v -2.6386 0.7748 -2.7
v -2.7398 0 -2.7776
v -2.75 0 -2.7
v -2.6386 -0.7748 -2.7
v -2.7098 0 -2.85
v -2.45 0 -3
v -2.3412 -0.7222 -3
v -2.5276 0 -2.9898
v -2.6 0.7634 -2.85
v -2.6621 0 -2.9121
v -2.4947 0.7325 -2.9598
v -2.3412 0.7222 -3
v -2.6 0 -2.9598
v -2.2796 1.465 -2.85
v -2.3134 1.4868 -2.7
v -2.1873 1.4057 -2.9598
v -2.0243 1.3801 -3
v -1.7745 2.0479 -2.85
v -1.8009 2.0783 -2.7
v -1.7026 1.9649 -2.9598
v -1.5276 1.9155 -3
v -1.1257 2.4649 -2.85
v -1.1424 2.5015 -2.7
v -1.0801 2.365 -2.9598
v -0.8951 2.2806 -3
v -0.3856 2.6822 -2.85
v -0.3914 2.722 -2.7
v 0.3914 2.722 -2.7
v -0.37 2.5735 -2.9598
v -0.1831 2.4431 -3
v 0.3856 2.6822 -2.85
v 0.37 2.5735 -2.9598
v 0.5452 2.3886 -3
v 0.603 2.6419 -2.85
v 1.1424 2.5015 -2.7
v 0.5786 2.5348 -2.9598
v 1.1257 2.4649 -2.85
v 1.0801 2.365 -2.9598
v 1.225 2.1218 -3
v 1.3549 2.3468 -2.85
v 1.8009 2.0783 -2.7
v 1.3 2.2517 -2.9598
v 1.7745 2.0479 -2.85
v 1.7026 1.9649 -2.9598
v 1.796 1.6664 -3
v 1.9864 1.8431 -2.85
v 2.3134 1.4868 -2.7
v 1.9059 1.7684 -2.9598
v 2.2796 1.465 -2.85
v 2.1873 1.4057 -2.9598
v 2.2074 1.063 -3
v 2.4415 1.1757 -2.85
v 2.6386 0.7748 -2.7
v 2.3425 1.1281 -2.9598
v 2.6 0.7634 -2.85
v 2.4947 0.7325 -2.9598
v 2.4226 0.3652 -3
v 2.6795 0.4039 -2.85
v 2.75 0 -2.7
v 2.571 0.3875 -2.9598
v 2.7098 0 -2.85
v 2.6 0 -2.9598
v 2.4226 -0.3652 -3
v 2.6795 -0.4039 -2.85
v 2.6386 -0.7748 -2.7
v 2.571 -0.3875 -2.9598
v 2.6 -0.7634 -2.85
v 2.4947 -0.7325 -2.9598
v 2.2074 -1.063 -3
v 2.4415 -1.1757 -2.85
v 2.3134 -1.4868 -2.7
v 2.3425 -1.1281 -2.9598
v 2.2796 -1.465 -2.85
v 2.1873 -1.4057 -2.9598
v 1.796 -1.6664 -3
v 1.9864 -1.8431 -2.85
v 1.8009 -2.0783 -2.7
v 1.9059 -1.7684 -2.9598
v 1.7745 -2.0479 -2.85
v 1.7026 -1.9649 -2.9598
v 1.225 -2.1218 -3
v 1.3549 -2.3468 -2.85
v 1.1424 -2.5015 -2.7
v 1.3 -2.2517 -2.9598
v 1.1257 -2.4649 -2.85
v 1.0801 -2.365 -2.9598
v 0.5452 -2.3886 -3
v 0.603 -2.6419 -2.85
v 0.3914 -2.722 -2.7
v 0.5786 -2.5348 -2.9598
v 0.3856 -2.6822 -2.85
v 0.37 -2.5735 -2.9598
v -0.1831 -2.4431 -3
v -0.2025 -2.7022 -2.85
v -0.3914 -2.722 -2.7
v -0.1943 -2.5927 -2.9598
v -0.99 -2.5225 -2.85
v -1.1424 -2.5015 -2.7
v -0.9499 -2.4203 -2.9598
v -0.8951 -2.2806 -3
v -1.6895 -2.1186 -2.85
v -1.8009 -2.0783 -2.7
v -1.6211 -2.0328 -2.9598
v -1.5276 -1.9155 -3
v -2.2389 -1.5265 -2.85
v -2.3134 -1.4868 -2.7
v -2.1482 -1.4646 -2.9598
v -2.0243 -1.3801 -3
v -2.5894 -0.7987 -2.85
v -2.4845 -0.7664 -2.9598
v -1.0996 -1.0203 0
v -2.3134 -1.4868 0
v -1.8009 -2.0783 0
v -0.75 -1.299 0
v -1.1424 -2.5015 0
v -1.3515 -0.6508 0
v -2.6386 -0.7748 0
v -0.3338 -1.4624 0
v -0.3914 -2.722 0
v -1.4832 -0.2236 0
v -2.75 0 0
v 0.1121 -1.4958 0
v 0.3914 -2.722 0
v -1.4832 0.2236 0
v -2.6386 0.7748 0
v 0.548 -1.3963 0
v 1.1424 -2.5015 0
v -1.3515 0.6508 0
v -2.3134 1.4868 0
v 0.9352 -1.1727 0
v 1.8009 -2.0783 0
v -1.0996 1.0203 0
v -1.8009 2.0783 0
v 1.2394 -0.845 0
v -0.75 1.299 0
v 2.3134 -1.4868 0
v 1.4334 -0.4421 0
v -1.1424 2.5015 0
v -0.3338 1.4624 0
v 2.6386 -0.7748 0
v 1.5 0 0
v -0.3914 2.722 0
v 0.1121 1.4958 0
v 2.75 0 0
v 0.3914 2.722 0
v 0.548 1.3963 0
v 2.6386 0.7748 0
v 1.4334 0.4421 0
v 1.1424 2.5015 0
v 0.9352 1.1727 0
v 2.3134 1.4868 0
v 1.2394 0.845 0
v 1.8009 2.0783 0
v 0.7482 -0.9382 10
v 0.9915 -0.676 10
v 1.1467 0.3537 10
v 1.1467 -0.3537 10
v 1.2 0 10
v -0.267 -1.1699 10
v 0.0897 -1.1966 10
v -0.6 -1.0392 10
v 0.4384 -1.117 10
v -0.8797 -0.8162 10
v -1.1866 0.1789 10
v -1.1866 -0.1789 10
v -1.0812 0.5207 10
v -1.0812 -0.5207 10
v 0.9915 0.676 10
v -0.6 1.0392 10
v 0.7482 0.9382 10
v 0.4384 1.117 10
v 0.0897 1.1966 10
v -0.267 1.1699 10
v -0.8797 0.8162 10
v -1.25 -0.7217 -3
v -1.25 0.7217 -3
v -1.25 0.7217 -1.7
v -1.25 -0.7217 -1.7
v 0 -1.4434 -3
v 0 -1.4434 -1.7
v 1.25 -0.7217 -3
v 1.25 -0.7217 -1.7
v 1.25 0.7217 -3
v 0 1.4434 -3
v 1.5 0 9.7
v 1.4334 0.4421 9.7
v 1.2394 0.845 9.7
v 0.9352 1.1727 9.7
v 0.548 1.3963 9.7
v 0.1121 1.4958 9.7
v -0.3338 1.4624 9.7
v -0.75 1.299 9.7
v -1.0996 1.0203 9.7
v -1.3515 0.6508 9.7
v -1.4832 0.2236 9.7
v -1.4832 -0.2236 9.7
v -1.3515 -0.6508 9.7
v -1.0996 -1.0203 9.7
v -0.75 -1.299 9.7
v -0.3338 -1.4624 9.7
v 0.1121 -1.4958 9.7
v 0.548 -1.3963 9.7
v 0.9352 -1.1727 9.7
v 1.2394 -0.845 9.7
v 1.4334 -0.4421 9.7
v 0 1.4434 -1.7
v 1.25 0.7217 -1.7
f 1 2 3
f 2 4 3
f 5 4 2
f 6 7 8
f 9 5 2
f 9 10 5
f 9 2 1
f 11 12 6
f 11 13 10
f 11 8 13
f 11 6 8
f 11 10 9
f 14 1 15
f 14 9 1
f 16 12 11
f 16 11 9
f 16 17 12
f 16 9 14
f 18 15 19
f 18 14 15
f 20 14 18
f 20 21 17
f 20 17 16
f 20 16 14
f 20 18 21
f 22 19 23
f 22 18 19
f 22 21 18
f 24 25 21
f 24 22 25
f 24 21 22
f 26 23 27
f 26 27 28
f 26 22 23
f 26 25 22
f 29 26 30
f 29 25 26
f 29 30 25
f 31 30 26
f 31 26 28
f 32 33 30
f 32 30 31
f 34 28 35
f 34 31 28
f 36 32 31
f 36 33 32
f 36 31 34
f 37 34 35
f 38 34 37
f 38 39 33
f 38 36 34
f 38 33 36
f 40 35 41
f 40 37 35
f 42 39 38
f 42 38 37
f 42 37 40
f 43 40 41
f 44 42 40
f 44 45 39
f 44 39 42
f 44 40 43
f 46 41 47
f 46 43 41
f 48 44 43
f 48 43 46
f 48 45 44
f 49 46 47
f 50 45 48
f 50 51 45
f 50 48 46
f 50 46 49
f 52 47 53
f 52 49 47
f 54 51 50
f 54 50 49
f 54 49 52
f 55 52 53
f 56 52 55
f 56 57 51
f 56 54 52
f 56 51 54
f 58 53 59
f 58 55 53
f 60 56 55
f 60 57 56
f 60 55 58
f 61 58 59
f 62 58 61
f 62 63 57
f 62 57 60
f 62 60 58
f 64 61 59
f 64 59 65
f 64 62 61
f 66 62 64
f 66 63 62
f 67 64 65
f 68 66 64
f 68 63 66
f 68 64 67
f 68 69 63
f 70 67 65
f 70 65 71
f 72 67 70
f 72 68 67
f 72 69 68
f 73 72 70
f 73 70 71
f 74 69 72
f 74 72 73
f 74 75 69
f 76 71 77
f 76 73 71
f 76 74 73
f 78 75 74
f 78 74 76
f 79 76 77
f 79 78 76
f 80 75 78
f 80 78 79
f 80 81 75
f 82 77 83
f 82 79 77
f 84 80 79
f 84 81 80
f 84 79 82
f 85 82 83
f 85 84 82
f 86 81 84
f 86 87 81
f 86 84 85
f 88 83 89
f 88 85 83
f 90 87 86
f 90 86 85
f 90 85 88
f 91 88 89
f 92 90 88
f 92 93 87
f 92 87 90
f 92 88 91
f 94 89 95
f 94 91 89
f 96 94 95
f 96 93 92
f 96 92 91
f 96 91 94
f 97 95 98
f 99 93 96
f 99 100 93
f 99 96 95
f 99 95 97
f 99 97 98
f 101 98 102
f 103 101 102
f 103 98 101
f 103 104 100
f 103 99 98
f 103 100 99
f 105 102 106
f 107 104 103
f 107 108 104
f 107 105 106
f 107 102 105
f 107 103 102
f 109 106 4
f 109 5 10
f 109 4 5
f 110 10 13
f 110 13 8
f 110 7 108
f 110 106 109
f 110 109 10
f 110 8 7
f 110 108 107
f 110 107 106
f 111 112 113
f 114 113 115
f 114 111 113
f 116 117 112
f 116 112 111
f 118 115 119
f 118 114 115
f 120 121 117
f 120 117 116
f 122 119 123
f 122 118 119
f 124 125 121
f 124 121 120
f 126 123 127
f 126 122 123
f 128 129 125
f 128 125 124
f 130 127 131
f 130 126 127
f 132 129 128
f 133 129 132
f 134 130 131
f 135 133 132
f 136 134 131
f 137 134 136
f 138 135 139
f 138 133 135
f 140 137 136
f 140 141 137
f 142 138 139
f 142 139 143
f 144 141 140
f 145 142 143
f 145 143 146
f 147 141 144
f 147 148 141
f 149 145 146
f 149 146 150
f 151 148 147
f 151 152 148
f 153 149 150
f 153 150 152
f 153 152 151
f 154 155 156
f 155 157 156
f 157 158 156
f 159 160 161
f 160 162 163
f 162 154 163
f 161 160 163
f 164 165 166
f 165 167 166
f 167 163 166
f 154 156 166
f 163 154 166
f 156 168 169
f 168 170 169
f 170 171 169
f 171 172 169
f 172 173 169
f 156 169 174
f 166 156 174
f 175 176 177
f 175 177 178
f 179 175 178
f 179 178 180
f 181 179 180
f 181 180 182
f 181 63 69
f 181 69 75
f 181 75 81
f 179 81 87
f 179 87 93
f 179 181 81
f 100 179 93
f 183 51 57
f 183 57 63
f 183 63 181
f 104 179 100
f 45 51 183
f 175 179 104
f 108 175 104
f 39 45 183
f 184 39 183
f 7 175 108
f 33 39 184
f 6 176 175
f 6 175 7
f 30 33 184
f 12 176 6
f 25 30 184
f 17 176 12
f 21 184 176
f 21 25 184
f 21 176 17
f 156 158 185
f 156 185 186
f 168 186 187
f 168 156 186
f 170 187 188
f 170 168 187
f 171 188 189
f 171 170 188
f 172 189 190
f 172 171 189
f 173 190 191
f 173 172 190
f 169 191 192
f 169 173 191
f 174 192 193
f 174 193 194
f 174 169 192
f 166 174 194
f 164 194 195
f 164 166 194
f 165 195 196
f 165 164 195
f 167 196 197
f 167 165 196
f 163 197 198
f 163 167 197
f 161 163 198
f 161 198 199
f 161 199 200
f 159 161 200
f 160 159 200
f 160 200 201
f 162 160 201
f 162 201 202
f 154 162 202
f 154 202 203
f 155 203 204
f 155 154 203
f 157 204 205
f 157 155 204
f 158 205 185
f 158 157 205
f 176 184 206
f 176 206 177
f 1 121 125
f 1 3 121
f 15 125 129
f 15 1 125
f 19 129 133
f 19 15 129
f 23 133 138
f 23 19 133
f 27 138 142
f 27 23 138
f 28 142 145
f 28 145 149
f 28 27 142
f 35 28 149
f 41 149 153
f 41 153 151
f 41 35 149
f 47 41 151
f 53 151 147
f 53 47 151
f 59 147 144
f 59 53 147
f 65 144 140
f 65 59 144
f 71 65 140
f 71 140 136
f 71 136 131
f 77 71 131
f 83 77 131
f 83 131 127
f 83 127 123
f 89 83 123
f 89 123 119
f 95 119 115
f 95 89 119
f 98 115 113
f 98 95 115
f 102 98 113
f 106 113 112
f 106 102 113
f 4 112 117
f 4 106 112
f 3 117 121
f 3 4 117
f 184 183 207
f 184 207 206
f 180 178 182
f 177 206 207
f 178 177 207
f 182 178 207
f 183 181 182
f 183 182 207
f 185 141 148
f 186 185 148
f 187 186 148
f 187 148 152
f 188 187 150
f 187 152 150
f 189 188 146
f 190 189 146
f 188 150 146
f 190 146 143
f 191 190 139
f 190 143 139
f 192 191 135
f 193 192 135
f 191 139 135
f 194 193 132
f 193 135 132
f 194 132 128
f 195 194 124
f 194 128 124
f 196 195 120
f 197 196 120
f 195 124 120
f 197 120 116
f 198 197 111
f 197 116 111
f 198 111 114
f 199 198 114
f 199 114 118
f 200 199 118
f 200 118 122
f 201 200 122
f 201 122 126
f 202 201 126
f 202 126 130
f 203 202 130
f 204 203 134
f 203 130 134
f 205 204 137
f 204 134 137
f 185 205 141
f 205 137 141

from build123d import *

# Parameters (mm, degrees)
ENLEV_MAT_EXTRU1_DEPTH = 1.3
ESQUISSE3_W            = 1.5
ESQUISSE3_H            = 10
CHANFREIN1_SIZE        = 0.3


with BuildPart() as part:
    # Esquisse1 → Base-Révolution (revolve)
    with BuildSketch(Plane(origin=(0, 0, 0), x_dir=(1, 0, 0), z_dir=(0, 1, 0))):
        with BuildLine():
            Line((0, 0), (2.75, 0))
            Line((2.75, 0), (2.75, 2.7))
            ThreePointArc((2.75, 2.7), (2.662132034, 2.912132034), (2.45, 3))
            Line((2.45, 3), (0, 3))
            Line((0, 3), (0, 0))
        make_face()
    revolve(axis=Axis((0, 0, 0), (0, 0, -1)))

    # Esquisse2 → enlev-mat-Extru1 (cut)
    with BuildSketch(Plane.XY.offset(-3)):
        Polygon((1.25, -0.721687836), (1.25, 0.721687836), (0, 1.443375673), (-1.25, 0.721687836), (-1.25, -0.721687836), (0, -1.443375673), align=None)
    extrude(amount=ENLEV_MAT_EXTRU1_DEPTH, mode=Mode.SUBTRACT)

    # Esquisse3 → Boss.-Révol.1 (revolve)
    with BuildSketch(Plane(origin=(0, 0, 0), x_dir=(1, 0, 0), z_dir=(0, 1, 0))):
        with Locations((0.75, -5)):
            Rectangle(ESQUISSE3_W, ESQUISSE3_H)
    revolve(axis=Axis((0, 0, 0), (0, 0, 1)))

    # Chanfrein1
    chanfrein1_edges = [part.edges().sort_by_distance(p)[0] for p in [
        (-1.5, 0, 10),
    ]]
    chamfer(chanfrein1_edges, length=CHANFREIN1_SIZE)


solid = part.part
